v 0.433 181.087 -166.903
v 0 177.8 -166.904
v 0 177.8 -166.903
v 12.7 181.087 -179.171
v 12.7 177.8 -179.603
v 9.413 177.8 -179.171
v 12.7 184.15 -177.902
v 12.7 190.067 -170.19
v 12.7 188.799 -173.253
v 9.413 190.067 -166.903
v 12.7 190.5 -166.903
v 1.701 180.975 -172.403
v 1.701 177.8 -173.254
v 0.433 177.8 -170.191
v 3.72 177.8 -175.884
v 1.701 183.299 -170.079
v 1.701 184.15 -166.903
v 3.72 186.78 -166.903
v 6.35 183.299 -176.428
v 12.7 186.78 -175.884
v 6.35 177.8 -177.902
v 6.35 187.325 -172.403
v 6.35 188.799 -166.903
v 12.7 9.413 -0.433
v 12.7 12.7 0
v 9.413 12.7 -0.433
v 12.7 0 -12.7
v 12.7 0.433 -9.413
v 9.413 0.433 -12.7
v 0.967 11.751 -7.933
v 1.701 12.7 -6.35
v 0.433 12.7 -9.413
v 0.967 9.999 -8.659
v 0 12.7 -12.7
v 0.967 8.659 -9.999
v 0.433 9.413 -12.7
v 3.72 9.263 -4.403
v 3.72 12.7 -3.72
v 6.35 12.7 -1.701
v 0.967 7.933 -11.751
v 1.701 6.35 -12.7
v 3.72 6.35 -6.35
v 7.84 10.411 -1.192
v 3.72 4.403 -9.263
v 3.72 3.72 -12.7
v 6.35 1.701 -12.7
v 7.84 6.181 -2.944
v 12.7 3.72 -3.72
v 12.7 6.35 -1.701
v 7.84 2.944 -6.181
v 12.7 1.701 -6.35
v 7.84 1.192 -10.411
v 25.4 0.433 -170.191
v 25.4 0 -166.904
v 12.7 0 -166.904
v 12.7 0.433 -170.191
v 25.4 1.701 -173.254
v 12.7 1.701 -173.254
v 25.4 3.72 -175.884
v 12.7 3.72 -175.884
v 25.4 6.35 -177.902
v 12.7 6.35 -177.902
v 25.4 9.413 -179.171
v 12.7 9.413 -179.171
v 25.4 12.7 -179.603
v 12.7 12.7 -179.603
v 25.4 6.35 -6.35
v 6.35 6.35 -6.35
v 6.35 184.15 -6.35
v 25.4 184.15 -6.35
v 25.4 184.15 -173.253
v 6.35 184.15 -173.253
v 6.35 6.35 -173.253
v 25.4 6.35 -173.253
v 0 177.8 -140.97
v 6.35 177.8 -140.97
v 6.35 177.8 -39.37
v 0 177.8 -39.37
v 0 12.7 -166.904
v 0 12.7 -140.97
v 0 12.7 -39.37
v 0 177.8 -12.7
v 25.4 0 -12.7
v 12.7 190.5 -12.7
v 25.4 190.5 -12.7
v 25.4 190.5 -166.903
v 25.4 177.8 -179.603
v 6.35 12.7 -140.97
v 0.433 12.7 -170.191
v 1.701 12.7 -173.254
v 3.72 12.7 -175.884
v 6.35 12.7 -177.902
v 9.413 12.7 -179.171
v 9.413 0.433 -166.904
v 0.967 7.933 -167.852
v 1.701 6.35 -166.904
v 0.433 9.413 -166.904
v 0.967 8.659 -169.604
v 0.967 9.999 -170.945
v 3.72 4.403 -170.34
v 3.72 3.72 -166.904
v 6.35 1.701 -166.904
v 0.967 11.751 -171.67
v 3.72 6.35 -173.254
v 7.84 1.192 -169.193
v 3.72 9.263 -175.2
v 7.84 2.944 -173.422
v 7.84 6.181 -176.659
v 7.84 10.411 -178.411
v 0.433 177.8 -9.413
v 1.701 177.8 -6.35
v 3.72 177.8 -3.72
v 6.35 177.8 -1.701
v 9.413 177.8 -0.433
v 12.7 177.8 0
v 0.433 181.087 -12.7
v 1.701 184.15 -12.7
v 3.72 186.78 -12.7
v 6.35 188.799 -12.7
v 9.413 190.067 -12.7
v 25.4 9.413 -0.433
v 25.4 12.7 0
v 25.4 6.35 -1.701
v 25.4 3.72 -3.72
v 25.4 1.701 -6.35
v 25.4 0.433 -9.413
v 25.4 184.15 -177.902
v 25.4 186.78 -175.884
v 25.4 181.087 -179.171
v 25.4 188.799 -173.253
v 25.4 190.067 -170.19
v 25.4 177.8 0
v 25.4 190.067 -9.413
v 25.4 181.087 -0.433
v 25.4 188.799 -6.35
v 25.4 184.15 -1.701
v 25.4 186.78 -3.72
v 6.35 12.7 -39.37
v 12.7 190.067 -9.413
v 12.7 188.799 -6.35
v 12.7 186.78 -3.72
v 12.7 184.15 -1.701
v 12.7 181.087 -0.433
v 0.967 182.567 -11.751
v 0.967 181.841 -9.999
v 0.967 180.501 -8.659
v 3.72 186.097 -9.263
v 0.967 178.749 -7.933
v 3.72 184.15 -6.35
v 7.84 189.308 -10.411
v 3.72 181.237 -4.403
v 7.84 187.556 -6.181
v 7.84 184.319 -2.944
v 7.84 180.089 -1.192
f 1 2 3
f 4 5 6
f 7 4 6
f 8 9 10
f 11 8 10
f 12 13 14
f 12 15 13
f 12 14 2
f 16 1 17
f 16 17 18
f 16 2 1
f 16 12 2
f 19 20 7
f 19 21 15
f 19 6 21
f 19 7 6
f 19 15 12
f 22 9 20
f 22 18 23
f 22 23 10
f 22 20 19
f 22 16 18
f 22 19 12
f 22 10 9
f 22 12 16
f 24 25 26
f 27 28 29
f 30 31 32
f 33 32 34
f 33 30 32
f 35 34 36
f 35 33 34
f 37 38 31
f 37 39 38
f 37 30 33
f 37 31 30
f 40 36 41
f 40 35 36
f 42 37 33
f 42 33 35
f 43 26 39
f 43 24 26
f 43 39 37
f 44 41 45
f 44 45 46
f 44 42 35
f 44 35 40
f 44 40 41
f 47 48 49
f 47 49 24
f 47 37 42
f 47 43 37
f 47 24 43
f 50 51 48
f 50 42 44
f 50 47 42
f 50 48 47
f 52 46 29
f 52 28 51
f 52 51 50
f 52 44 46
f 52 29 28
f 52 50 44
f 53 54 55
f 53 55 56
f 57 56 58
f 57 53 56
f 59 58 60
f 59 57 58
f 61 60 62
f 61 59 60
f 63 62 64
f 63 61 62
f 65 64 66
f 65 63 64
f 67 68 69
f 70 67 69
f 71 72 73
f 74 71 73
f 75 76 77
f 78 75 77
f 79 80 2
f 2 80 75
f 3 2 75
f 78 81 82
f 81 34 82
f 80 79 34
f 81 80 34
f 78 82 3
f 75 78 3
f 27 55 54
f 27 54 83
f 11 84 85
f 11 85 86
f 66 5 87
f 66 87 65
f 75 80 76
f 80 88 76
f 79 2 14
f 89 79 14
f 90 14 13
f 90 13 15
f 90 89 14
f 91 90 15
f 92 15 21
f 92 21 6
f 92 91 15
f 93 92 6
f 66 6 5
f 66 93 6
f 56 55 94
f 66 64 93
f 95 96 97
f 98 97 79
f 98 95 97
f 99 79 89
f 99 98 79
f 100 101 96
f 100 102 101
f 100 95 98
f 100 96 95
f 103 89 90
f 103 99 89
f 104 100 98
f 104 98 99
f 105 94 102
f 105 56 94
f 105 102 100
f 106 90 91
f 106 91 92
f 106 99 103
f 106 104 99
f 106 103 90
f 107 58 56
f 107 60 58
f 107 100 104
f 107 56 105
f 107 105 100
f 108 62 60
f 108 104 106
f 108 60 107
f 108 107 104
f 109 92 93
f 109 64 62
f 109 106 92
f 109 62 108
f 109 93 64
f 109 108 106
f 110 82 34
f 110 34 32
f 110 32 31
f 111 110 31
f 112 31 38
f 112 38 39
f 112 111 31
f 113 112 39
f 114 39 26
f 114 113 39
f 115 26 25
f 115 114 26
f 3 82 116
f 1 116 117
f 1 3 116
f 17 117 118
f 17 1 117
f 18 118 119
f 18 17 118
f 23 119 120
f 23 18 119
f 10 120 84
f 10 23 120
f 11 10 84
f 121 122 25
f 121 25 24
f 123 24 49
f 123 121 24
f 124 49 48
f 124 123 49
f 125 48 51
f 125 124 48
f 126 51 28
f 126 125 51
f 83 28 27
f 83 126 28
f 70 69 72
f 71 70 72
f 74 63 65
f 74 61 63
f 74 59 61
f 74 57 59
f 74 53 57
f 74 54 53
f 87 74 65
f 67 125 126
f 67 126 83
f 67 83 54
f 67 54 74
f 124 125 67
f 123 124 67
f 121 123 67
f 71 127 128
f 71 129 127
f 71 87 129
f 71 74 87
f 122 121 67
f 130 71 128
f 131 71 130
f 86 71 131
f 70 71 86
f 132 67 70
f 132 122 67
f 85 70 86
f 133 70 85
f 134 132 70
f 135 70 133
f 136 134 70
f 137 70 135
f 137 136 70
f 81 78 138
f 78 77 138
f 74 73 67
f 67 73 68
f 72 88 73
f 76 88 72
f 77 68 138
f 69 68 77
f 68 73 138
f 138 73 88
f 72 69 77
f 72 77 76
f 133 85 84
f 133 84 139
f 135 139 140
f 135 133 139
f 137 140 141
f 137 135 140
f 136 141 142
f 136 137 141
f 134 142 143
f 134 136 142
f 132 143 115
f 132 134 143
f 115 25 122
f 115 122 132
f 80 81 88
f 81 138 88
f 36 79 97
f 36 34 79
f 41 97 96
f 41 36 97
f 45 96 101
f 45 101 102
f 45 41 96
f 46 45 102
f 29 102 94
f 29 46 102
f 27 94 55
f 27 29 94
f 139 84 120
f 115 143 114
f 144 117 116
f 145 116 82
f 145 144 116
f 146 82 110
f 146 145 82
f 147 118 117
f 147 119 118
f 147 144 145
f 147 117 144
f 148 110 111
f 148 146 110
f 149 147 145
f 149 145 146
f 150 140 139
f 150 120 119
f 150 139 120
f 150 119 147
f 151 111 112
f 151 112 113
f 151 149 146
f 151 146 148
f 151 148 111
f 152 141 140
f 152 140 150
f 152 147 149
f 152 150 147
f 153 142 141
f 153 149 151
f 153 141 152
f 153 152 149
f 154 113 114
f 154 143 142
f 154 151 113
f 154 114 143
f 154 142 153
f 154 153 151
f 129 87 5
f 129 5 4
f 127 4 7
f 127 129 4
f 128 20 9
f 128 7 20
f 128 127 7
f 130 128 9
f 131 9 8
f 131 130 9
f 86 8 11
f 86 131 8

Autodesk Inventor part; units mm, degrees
ref_plane "YZ Plane" through (0, 0, 0) normal (1, 0, 0) x (0, 1, 0)
ref_plane "XZ Plane" through (0, 0, 0) normal (0, 1, 0) x (-1, 0, 0)
ref_plane "XY Plane" through (0, 0, 0) normal (0, 0, 1) x (1, 0, 0)
sketch "Sketch1" plane through (0, 0, 0) normal (1, 0, 0) x (0, 1, 0)
  line L0 (0, 0) -> (190.5, 0)
  line L1 (190.5, 0) -> (190.5, -179.6034)
  line L2 (190.5, -179.6034) -> (0, -179.6034)
  line L3 (0, -179.6034) -> (0, 0)
  dimension "d0" = 190.5
  dimension "d1" = 179.6034
extrude "Extrusion1" add sketch "Sketch1" along normal blind 25.4
shell "Shell1" thickness 6.35 removed faces 1 at (25.4, 127, -119.7356)
sketch "Sketch2" plane through (6.35, 6.35, -173.2534) normal (1, 0, 0) x (0, 0, -1)
  line L0 (-32.2834, 171.45) -> (-133.8834, 171.45)
  line L1 (-133.8834, 171.45) -> (-133.8834, 6.35)
  line L2 (-133.8834, 6.35) -> (-32.2834, 6.35)
  line L3 (-32.2834, 6.35) -> (-32.2834, 171.45)
  line L4 (-166.9034, 177.8) -> (0, 177.8) projected
  line L5 (-166.9034, 0) -> (-166.9034, 177.8) projected
  point P0 (-173.2534, -6.35)
  dimension "d5" = 165.1
  dimension "d6" = 101.6
  dimension "d7" = 6.35
  dimension "d8" = 33.02
extrude "Extrusion2" cut sketch "Sketch2" against normal through all
fillet "Fillet1" radius 12.7 1 edges at (12.7, 190.5, -179.6034)
fillet "Fillet2" radius 12.7 8 edges at (12.7, 190.5, 0) (12.7, 0, 0) (12.7, 0, -179.6034) (0, 0, -89.8017) (0, 186.7803, -175.8837) (0, 190.5, -83.4517) (0, 88.9, -179.6034) (0, 95.25, 0)
properties part number "outer_casing"
